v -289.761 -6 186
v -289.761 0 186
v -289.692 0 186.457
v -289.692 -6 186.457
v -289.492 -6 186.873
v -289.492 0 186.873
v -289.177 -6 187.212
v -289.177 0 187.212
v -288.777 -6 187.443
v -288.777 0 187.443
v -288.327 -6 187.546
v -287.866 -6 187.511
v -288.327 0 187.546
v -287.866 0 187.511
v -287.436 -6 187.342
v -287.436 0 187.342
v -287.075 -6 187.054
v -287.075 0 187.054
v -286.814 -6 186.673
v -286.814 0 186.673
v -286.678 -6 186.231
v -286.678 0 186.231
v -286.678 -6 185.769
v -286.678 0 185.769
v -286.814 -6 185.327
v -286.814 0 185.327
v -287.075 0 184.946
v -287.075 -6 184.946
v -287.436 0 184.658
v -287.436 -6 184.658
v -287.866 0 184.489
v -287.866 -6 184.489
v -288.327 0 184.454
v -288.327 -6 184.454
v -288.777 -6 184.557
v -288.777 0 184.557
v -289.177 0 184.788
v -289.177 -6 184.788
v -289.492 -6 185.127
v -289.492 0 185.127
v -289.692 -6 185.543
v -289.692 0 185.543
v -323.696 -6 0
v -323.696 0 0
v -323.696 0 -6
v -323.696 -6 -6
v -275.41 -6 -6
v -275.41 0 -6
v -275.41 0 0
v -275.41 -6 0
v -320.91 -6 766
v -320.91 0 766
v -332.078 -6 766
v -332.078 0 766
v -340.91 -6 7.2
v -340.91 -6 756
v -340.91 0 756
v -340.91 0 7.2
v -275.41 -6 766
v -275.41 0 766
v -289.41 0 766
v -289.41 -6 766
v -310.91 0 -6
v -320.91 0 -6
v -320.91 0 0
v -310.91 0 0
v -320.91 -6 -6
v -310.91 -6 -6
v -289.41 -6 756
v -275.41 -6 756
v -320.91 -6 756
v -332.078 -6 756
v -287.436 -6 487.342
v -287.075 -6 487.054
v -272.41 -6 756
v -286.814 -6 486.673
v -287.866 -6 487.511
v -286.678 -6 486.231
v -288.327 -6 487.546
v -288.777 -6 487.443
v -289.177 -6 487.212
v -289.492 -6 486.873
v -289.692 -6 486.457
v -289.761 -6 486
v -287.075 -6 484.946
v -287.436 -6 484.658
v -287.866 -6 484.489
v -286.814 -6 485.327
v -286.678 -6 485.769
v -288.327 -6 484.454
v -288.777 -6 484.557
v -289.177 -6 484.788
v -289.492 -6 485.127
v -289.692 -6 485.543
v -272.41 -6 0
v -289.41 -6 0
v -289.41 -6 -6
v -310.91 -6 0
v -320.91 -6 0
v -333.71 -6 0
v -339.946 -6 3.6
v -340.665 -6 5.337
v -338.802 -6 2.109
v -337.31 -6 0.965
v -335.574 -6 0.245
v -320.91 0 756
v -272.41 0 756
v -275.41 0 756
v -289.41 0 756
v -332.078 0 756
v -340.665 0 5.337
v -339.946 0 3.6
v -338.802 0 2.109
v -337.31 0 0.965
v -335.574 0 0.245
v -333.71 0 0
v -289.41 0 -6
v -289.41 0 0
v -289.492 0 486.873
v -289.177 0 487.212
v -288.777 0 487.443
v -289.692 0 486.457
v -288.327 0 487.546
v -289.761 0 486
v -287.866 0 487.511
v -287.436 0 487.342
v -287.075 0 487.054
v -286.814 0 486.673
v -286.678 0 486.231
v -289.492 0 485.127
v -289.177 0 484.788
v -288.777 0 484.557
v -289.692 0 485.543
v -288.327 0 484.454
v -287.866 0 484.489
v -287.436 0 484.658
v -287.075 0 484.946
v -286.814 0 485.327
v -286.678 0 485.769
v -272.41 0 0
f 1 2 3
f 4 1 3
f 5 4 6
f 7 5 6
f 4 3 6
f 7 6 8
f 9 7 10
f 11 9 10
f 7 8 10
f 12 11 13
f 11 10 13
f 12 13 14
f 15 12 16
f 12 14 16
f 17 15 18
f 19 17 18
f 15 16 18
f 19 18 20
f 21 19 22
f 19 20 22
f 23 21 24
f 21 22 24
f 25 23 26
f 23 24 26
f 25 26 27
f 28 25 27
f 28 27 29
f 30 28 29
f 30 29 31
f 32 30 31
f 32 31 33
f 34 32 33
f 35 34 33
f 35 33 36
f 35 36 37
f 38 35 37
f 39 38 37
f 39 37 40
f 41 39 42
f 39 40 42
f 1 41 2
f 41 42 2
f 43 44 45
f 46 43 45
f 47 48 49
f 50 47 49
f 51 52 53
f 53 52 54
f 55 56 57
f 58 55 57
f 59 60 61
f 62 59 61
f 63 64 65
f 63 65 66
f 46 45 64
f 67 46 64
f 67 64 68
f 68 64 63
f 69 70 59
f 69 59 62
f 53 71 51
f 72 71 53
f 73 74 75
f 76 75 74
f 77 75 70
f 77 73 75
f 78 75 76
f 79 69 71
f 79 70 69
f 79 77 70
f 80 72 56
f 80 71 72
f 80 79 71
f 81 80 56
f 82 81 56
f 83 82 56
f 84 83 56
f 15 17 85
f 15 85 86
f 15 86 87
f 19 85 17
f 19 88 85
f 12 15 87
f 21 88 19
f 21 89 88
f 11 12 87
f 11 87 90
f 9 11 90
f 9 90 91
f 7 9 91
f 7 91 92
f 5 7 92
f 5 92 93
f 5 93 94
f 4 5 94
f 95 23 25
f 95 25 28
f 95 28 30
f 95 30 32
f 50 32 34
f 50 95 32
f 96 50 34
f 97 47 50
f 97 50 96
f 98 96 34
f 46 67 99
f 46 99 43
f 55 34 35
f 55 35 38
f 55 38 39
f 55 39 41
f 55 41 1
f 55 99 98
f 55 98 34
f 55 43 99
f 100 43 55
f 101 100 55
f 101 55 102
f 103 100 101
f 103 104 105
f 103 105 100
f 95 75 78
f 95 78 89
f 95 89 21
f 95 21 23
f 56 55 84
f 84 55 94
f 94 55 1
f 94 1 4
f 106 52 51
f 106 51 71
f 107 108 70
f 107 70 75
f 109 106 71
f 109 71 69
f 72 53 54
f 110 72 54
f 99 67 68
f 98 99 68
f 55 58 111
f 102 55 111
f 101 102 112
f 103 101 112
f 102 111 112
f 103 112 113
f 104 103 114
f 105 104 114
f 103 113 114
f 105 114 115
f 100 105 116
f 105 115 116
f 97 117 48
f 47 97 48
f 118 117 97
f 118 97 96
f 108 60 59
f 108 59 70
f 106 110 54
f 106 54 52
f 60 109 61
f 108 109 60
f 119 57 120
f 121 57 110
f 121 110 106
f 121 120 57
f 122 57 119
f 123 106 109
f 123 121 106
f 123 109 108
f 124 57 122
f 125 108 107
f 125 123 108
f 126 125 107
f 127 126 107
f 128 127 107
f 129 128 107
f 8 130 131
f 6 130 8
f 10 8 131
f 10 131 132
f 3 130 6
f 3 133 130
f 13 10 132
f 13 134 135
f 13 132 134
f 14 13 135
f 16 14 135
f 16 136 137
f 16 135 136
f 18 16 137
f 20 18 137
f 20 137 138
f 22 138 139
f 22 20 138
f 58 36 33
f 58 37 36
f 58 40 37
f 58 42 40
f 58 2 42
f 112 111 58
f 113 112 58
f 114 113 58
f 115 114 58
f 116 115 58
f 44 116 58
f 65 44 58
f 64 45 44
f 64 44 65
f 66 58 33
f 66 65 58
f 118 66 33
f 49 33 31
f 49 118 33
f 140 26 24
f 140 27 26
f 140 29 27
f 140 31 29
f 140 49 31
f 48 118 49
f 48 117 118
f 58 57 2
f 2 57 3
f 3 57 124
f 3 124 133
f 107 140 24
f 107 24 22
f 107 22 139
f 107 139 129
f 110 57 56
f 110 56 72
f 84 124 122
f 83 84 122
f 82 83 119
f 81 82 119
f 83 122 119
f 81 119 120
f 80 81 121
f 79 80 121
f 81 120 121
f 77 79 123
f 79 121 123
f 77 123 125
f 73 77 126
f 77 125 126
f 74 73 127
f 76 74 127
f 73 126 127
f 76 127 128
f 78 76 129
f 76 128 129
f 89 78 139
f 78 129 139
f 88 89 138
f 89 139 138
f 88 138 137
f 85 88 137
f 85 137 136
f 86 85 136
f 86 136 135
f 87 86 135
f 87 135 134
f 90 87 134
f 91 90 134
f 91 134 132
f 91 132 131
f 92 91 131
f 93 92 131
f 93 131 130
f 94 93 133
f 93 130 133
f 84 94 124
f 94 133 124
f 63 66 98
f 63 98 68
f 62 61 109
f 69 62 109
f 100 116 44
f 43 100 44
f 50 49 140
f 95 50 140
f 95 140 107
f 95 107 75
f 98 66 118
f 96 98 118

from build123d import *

# Parameters (mm, degrees)
DODANIE_WYCI_GNI_CIE1_DEPTH      = 766
DODANIE_WYCI_GNI_CIE1_DEPTH_BACK = 10
OBIEKT_PRZENIE_KOPIUJ1_ANGLE     = 10
SZKIC2_W                         = 31.5
SZKIC2_H                         = 10
SZKIC2_W_2                       = 8
SZKIC2_H_2                       = 4
SZKIC2_W_3                       = 3
WYTNIJ_WYCI_GNI_CIE1_DEPTH       = 6
SZKIC3_R                         = 1.55
WYTNIJ_WYCI_GNI_CIE2_DEPTH       = 6
SZYK_LINIOWY1_COUNT              = 2
SZYK_LINIOWY1_PITCH              = 300
WYTNIJ_WYCI_GNI_CIE3_DEPTH       = 6
SZKIC5_W                         = 12
SZKIC5_H                         = 6
DODANIE_WYCI_GNI_CIE2_DEPTH      = 6
SZKIC14_W                        = 8.832436052
SZKIC14_H                        = 6
WYTNIJ_WYCI_GNI_CIE6_DEPTH       = 10


with BuildPart() as part:
    # Szkic1 → Dodanie-wyciągnięcie1 (new, two sides: drawn at the far end of the back side and taken through both)
    with BuildSketch(Plane.XY.offset(-DODANIE_WYCI_GNI_CIE1_DEPTH_BACK)):
        Polygon((-272.410348111, -398.072591802), (-271.368459045, -403.98143832), (-338.827790127, -415.87633849), (-339.869679193, -409.967491972), align=None)
    extrude(amount=DODANIE_WYCI_GNI_CIE1_DEPTH + DODANIE_WYCI_GNI_CIE1_DEPTH_BACK)


with BuildPart() as part_1:
    # Obiekt-Przenieś/Kopiuj1: read off the stored shape, not the designer's step
    # Obiekt-Przenieś/Kopiuj1: moved
    add(part.part.moved(Location((4.1385253, 350.7690313, 0))).rotate(Axis((0, 0, 0), (0, 0, -1)), OBIEKT_PRZENIE_KOPIUJ1_ANGLE))

    # Szkic2 → Wytnij-wyciągnięcie1 (cut)
    with BuildSketch(Plane(origin=(0, 0, 0), x_dir=(1, 0, 0), z_dir=(0, 1, 0))):
        with Locations((-305.160348111, -761)):
            Rectangle(SZKIC2_W, SZKIC2_H)
        with Locations((-336.910348111, -768)):
            Rectangle(SZKIC2_W_2, SZKIC2_H_2)
        with Locations((-273.910348111, -761)):
            Rectangle(SZKIC2_W_3, SZKIC2_H)
    wytnij_wyci_gni_cie1 = extrude(amount=-WYTNIJ_WYCI_GNI_CIE1_DEPTH, mode=Mode.SUBTRACT)

    # Szkic3 → Wytnij-wyciągnięcie2 (cut)
    with BuildSketch(Plane(origin=(0, 0, 0), x_dir=(1, 0, 0), z_dir=(0, 1, 0))):
        with Locations(Location((-288.210889387, -486, 0), (0, 0, 180))):
            Circle(SZKIC3_R)
    wytnij_wyci_gni_cie2 = extrude(amount=-WYTNIJ_WYCI_GNI_CIE2_DEPTH, mode=Mode.SUBTRACT)

    # Szyk liniowy1: Wytnij-wyciągnięcie2 ×2
    with Locations(*[(0, 0, -i * SZYK_LINIOWY1_PITCH) for i in range(1, SZYK_LINIOWY1_COUNT)]):
        add(wytnij_wyci_gni_cie2, mode=Mode.SUBTRACT)

    # Lustro1: Wytnij-wyciągnięcie1 across plane
    add(wytnij_wyci_gni_cie1.mirror(Plane(origin=(-569.794054039, 7.161771209, 378), x_dir=(1, 0, 0), z_dir=(0, 0, 1))), mode=Mode.SUBTRACT)

    # Szkic4 → Wytnij-wyciągnięcie3 (cut)
    with BuildSketch(Plane(origin=(0, 0, 0), x_dir=(1, 0, 0), z_dir=(0, 1, 0))):
        with BuildLine():
            Line((-275.410348111, 10), (-340.910348111, 10))
            Line((-340.910348111, 10), (-340.910348111, -7.2))
            ThreePointArc((-340.910348111, -7.2), (-338.801516936, -2.108831175), (-333.710348111, 0))
            Line((-333.710348111, 0), (-323.696161673, 0))
            Line((-323.696161673, 0), (-323.696161673, 6))
            Line((-323.696161673, 6), (-275.410348111, 6))
            Line((-275.410348111, 6), (-275.410348111, 10))
        make_face()
    extrude(amount=-WYTNIJ_WYCI_GNI_CIE3_DEPTH, mode=Mode.SUBTRACT)

    # Szkic5 → Dodanie-wyciągnięcie2 (add)
    with BuildSketch(Plane(origin=(0, 0, 0), x_dir=(1, 0, 0), z_dir=(0, 1, 0))):
        with Locations((-316.910348111, 3)):
            Rectangle(SZKIC5_W, SZKIC5_H)
    extrude(amount=-DODANIE_WYCI_GNI_CIE2_DEPTH)

    # Szkic14 → Wytnij-wyciągnięcie6 (cut)
    with BuildSketch(Plane.XY.offset(766)):
        with Locations((-336.494130085, -3)):
            Rectangle(SZKIC14_W, SZKIC14_H)
    extrude(amount=-WYTNIJ_WYCI_GNI_CIE6_DEPTH, mode=Mode.SUBTRACT)


solid = part_1.part
